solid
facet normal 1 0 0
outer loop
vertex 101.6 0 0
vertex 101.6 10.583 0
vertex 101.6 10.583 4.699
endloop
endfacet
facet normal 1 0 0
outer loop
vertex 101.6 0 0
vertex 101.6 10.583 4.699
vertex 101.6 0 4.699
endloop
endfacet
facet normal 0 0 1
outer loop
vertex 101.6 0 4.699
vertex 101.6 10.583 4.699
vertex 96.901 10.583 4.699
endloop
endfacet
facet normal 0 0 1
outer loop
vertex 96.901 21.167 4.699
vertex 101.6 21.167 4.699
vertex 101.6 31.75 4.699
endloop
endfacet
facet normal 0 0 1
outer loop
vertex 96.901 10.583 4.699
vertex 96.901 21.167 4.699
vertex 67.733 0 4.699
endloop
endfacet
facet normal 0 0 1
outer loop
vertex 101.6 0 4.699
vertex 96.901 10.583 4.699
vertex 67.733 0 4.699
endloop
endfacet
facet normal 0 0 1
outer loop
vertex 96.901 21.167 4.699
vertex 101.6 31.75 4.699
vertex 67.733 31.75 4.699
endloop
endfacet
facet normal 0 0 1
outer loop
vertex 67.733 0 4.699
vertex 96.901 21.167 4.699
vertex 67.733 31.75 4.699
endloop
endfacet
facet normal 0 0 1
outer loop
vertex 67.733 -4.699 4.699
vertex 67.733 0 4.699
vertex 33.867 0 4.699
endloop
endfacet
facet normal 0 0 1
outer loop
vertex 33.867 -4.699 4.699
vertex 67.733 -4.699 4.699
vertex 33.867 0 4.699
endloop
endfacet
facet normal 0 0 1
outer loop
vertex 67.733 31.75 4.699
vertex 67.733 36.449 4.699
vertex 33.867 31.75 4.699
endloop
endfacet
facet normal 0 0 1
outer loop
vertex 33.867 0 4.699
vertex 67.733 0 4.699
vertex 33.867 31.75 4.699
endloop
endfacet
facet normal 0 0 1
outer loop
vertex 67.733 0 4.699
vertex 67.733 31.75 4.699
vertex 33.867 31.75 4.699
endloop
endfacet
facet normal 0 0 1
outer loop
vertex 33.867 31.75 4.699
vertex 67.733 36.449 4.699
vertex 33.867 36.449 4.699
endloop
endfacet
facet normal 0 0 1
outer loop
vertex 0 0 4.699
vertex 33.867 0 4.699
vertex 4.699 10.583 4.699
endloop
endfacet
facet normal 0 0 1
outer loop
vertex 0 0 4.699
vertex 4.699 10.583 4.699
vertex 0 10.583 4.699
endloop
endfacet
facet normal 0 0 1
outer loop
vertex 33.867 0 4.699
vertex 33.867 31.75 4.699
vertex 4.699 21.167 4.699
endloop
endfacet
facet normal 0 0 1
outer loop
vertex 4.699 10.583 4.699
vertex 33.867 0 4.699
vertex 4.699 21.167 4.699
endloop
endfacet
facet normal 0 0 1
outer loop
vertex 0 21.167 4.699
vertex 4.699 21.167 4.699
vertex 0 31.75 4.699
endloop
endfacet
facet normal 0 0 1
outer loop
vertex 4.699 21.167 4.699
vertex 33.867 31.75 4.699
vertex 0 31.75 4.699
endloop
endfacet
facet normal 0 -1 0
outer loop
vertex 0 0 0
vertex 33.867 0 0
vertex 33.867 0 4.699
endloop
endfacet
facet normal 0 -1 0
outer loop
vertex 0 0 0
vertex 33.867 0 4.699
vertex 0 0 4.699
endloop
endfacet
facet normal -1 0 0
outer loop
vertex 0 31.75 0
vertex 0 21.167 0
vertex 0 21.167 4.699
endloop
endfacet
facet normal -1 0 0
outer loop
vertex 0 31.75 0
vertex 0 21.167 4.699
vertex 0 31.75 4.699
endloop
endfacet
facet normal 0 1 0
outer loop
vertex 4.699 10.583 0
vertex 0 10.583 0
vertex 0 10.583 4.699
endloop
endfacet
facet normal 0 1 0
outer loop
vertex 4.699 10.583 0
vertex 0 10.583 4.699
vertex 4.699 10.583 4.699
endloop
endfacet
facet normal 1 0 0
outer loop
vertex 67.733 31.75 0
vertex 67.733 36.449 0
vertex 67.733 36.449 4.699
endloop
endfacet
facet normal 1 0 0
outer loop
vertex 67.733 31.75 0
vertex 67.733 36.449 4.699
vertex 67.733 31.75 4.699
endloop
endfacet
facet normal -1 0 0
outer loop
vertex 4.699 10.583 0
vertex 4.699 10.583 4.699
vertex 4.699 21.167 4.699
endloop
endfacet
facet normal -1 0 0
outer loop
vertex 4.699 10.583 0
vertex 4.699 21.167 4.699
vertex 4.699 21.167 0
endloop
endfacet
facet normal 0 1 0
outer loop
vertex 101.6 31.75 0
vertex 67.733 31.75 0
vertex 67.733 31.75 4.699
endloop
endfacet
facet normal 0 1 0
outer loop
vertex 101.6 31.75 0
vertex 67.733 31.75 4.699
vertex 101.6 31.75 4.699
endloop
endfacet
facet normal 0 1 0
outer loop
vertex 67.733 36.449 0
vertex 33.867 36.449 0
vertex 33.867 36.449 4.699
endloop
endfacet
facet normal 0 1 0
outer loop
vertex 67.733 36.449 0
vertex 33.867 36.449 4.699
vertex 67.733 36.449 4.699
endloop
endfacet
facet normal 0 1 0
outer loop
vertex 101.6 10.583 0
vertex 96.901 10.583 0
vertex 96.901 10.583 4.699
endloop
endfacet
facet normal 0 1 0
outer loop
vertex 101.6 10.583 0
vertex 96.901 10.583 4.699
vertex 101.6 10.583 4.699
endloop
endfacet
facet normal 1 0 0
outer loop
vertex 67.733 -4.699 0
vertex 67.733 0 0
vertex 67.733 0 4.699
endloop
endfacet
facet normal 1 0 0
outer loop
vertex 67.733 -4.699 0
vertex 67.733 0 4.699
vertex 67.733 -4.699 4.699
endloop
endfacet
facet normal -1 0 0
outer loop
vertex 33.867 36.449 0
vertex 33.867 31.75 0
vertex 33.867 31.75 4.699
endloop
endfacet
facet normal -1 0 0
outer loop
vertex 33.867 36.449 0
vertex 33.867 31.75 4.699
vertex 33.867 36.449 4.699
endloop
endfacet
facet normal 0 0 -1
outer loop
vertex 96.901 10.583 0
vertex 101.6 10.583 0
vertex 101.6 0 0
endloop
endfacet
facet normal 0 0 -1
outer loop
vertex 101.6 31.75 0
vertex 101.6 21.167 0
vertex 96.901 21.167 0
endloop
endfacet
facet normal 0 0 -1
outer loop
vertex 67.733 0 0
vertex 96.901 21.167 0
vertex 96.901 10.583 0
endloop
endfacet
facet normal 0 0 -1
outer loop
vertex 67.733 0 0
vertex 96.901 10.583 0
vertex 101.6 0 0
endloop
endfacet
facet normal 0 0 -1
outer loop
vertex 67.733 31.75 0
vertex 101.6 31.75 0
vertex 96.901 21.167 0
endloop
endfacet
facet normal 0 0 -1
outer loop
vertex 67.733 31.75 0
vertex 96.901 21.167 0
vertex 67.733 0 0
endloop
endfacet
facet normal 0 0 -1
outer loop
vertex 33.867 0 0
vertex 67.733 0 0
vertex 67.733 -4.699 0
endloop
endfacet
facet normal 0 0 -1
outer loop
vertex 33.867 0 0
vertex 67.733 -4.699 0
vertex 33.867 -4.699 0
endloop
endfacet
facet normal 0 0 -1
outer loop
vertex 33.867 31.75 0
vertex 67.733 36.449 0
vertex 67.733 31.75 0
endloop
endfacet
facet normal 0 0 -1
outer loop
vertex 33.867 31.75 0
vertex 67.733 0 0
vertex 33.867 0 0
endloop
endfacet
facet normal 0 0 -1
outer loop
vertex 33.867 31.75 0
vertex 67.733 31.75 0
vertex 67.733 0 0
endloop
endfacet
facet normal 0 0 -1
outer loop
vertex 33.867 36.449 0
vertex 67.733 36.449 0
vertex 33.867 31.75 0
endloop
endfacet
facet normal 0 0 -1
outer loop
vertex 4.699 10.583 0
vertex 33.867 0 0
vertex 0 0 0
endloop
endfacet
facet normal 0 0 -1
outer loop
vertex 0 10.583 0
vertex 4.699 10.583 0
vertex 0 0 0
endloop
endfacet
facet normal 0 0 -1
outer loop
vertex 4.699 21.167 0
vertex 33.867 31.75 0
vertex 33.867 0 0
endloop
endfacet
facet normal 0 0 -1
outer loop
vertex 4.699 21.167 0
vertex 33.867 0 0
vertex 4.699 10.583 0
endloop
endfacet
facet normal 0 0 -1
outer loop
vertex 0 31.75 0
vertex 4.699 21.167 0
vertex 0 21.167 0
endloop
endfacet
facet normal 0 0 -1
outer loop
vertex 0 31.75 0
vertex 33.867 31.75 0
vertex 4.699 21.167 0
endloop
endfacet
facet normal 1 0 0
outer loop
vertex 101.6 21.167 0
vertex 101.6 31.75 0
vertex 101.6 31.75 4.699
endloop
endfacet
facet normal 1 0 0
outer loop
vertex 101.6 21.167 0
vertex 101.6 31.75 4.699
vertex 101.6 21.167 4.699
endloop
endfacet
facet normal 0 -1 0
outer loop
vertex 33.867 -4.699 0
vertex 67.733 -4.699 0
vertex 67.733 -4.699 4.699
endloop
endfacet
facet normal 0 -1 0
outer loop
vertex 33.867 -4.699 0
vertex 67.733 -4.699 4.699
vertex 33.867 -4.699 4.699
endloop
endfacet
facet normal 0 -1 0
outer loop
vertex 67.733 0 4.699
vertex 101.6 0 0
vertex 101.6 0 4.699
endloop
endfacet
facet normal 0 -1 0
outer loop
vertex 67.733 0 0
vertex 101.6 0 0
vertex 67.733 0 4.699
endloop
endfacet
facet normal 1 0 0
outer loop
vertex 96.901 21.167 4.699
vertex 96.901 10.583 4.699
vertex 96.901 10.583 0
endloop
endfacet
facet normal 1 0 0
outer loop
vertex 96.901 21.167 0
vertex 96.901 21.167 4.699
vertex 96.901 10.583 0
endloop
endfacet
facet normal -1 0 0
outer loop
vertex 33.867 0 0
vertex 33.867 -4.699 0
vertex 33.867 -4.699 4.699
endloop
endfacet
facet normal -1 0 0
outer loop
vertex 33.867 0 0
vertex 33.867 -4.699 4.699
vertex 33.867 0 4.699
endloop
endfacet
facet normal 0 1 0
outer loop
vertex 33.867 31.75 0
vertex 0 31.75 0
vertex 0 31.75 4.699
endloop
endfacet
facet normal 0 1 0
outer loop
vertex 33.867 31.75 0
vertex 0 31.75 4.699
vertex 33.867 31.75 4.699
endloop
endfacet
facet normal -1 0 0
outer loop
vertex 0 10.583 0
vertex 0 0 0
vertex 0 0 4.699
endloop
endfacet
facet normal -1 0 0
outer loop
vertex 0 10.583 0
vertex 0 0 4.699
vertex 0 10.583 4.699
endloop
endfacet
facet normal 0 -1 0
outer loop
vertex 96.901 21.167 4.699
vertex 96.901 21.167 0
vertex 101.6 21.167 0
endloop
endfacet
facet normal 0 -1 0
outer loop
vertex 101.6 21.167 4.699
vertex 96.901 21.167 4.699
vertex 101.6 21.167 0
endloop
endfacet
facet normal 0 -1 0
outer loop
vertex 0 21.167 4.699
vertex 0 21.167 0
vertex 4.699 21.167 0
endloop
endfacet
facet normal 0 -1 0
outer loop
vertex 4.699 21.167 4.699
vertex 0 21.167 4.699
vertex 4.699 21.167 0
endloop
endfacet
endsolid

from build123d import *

# Parameters (mm, degrees)
BOSS_EXTRUDE1_DEPTH = 4.699
CAVITY1_START       = 10.583333333
CAVITY1_OUTLINE_W   = 4.699
CAVITY1_OUTLINE_H   = 4.699
CAVITY1_DEPTH       = 10.583333334


# Read off the part's stored shape, not the designer's step: Cavity1
with BuildPart() as part:
    # Sketch1 → Boss-Extrude1 (new body)
    with BuildSketch(Plane.XY):
        Polygon((67.733333333, 31.75), (101.6, 31.75), (101.6, 0), (67.733333333, 0), (67.733333333, -4.699), (33.866666667, -4.699), (33.866666667, 0), (0, 0), (0, 31.75), (33.866666667, 31.75), (33.866666667, 36.449), (67.733333333, 36.449), align=None)
    extrude(amount=BOSS_EXTRUDE1_DEPTH)

    # Cavity1 outline → Cavity1 (cut)
    with BuildSketch(Plane(origin=(0, 0, 0), x_dir=(1, 0, 0), z_dir=(0, 1, 0)).offset(CAVITY1_START)):
        with Locations((2.3495, -2.3495)):
            Rectangle(CAVITY1_OUTLINE_W, CAVITY1_OUTLINE_H)
        with Locations((99.2505, -2.3495)):
            Rectangle(CAVITY1_OUTLINE_W, CAVITY1_OUTLINE_H)
    extrude(amount=CAVITY1_DEPTH, mode=Mode.SUBTRACT)


solid = part.part
